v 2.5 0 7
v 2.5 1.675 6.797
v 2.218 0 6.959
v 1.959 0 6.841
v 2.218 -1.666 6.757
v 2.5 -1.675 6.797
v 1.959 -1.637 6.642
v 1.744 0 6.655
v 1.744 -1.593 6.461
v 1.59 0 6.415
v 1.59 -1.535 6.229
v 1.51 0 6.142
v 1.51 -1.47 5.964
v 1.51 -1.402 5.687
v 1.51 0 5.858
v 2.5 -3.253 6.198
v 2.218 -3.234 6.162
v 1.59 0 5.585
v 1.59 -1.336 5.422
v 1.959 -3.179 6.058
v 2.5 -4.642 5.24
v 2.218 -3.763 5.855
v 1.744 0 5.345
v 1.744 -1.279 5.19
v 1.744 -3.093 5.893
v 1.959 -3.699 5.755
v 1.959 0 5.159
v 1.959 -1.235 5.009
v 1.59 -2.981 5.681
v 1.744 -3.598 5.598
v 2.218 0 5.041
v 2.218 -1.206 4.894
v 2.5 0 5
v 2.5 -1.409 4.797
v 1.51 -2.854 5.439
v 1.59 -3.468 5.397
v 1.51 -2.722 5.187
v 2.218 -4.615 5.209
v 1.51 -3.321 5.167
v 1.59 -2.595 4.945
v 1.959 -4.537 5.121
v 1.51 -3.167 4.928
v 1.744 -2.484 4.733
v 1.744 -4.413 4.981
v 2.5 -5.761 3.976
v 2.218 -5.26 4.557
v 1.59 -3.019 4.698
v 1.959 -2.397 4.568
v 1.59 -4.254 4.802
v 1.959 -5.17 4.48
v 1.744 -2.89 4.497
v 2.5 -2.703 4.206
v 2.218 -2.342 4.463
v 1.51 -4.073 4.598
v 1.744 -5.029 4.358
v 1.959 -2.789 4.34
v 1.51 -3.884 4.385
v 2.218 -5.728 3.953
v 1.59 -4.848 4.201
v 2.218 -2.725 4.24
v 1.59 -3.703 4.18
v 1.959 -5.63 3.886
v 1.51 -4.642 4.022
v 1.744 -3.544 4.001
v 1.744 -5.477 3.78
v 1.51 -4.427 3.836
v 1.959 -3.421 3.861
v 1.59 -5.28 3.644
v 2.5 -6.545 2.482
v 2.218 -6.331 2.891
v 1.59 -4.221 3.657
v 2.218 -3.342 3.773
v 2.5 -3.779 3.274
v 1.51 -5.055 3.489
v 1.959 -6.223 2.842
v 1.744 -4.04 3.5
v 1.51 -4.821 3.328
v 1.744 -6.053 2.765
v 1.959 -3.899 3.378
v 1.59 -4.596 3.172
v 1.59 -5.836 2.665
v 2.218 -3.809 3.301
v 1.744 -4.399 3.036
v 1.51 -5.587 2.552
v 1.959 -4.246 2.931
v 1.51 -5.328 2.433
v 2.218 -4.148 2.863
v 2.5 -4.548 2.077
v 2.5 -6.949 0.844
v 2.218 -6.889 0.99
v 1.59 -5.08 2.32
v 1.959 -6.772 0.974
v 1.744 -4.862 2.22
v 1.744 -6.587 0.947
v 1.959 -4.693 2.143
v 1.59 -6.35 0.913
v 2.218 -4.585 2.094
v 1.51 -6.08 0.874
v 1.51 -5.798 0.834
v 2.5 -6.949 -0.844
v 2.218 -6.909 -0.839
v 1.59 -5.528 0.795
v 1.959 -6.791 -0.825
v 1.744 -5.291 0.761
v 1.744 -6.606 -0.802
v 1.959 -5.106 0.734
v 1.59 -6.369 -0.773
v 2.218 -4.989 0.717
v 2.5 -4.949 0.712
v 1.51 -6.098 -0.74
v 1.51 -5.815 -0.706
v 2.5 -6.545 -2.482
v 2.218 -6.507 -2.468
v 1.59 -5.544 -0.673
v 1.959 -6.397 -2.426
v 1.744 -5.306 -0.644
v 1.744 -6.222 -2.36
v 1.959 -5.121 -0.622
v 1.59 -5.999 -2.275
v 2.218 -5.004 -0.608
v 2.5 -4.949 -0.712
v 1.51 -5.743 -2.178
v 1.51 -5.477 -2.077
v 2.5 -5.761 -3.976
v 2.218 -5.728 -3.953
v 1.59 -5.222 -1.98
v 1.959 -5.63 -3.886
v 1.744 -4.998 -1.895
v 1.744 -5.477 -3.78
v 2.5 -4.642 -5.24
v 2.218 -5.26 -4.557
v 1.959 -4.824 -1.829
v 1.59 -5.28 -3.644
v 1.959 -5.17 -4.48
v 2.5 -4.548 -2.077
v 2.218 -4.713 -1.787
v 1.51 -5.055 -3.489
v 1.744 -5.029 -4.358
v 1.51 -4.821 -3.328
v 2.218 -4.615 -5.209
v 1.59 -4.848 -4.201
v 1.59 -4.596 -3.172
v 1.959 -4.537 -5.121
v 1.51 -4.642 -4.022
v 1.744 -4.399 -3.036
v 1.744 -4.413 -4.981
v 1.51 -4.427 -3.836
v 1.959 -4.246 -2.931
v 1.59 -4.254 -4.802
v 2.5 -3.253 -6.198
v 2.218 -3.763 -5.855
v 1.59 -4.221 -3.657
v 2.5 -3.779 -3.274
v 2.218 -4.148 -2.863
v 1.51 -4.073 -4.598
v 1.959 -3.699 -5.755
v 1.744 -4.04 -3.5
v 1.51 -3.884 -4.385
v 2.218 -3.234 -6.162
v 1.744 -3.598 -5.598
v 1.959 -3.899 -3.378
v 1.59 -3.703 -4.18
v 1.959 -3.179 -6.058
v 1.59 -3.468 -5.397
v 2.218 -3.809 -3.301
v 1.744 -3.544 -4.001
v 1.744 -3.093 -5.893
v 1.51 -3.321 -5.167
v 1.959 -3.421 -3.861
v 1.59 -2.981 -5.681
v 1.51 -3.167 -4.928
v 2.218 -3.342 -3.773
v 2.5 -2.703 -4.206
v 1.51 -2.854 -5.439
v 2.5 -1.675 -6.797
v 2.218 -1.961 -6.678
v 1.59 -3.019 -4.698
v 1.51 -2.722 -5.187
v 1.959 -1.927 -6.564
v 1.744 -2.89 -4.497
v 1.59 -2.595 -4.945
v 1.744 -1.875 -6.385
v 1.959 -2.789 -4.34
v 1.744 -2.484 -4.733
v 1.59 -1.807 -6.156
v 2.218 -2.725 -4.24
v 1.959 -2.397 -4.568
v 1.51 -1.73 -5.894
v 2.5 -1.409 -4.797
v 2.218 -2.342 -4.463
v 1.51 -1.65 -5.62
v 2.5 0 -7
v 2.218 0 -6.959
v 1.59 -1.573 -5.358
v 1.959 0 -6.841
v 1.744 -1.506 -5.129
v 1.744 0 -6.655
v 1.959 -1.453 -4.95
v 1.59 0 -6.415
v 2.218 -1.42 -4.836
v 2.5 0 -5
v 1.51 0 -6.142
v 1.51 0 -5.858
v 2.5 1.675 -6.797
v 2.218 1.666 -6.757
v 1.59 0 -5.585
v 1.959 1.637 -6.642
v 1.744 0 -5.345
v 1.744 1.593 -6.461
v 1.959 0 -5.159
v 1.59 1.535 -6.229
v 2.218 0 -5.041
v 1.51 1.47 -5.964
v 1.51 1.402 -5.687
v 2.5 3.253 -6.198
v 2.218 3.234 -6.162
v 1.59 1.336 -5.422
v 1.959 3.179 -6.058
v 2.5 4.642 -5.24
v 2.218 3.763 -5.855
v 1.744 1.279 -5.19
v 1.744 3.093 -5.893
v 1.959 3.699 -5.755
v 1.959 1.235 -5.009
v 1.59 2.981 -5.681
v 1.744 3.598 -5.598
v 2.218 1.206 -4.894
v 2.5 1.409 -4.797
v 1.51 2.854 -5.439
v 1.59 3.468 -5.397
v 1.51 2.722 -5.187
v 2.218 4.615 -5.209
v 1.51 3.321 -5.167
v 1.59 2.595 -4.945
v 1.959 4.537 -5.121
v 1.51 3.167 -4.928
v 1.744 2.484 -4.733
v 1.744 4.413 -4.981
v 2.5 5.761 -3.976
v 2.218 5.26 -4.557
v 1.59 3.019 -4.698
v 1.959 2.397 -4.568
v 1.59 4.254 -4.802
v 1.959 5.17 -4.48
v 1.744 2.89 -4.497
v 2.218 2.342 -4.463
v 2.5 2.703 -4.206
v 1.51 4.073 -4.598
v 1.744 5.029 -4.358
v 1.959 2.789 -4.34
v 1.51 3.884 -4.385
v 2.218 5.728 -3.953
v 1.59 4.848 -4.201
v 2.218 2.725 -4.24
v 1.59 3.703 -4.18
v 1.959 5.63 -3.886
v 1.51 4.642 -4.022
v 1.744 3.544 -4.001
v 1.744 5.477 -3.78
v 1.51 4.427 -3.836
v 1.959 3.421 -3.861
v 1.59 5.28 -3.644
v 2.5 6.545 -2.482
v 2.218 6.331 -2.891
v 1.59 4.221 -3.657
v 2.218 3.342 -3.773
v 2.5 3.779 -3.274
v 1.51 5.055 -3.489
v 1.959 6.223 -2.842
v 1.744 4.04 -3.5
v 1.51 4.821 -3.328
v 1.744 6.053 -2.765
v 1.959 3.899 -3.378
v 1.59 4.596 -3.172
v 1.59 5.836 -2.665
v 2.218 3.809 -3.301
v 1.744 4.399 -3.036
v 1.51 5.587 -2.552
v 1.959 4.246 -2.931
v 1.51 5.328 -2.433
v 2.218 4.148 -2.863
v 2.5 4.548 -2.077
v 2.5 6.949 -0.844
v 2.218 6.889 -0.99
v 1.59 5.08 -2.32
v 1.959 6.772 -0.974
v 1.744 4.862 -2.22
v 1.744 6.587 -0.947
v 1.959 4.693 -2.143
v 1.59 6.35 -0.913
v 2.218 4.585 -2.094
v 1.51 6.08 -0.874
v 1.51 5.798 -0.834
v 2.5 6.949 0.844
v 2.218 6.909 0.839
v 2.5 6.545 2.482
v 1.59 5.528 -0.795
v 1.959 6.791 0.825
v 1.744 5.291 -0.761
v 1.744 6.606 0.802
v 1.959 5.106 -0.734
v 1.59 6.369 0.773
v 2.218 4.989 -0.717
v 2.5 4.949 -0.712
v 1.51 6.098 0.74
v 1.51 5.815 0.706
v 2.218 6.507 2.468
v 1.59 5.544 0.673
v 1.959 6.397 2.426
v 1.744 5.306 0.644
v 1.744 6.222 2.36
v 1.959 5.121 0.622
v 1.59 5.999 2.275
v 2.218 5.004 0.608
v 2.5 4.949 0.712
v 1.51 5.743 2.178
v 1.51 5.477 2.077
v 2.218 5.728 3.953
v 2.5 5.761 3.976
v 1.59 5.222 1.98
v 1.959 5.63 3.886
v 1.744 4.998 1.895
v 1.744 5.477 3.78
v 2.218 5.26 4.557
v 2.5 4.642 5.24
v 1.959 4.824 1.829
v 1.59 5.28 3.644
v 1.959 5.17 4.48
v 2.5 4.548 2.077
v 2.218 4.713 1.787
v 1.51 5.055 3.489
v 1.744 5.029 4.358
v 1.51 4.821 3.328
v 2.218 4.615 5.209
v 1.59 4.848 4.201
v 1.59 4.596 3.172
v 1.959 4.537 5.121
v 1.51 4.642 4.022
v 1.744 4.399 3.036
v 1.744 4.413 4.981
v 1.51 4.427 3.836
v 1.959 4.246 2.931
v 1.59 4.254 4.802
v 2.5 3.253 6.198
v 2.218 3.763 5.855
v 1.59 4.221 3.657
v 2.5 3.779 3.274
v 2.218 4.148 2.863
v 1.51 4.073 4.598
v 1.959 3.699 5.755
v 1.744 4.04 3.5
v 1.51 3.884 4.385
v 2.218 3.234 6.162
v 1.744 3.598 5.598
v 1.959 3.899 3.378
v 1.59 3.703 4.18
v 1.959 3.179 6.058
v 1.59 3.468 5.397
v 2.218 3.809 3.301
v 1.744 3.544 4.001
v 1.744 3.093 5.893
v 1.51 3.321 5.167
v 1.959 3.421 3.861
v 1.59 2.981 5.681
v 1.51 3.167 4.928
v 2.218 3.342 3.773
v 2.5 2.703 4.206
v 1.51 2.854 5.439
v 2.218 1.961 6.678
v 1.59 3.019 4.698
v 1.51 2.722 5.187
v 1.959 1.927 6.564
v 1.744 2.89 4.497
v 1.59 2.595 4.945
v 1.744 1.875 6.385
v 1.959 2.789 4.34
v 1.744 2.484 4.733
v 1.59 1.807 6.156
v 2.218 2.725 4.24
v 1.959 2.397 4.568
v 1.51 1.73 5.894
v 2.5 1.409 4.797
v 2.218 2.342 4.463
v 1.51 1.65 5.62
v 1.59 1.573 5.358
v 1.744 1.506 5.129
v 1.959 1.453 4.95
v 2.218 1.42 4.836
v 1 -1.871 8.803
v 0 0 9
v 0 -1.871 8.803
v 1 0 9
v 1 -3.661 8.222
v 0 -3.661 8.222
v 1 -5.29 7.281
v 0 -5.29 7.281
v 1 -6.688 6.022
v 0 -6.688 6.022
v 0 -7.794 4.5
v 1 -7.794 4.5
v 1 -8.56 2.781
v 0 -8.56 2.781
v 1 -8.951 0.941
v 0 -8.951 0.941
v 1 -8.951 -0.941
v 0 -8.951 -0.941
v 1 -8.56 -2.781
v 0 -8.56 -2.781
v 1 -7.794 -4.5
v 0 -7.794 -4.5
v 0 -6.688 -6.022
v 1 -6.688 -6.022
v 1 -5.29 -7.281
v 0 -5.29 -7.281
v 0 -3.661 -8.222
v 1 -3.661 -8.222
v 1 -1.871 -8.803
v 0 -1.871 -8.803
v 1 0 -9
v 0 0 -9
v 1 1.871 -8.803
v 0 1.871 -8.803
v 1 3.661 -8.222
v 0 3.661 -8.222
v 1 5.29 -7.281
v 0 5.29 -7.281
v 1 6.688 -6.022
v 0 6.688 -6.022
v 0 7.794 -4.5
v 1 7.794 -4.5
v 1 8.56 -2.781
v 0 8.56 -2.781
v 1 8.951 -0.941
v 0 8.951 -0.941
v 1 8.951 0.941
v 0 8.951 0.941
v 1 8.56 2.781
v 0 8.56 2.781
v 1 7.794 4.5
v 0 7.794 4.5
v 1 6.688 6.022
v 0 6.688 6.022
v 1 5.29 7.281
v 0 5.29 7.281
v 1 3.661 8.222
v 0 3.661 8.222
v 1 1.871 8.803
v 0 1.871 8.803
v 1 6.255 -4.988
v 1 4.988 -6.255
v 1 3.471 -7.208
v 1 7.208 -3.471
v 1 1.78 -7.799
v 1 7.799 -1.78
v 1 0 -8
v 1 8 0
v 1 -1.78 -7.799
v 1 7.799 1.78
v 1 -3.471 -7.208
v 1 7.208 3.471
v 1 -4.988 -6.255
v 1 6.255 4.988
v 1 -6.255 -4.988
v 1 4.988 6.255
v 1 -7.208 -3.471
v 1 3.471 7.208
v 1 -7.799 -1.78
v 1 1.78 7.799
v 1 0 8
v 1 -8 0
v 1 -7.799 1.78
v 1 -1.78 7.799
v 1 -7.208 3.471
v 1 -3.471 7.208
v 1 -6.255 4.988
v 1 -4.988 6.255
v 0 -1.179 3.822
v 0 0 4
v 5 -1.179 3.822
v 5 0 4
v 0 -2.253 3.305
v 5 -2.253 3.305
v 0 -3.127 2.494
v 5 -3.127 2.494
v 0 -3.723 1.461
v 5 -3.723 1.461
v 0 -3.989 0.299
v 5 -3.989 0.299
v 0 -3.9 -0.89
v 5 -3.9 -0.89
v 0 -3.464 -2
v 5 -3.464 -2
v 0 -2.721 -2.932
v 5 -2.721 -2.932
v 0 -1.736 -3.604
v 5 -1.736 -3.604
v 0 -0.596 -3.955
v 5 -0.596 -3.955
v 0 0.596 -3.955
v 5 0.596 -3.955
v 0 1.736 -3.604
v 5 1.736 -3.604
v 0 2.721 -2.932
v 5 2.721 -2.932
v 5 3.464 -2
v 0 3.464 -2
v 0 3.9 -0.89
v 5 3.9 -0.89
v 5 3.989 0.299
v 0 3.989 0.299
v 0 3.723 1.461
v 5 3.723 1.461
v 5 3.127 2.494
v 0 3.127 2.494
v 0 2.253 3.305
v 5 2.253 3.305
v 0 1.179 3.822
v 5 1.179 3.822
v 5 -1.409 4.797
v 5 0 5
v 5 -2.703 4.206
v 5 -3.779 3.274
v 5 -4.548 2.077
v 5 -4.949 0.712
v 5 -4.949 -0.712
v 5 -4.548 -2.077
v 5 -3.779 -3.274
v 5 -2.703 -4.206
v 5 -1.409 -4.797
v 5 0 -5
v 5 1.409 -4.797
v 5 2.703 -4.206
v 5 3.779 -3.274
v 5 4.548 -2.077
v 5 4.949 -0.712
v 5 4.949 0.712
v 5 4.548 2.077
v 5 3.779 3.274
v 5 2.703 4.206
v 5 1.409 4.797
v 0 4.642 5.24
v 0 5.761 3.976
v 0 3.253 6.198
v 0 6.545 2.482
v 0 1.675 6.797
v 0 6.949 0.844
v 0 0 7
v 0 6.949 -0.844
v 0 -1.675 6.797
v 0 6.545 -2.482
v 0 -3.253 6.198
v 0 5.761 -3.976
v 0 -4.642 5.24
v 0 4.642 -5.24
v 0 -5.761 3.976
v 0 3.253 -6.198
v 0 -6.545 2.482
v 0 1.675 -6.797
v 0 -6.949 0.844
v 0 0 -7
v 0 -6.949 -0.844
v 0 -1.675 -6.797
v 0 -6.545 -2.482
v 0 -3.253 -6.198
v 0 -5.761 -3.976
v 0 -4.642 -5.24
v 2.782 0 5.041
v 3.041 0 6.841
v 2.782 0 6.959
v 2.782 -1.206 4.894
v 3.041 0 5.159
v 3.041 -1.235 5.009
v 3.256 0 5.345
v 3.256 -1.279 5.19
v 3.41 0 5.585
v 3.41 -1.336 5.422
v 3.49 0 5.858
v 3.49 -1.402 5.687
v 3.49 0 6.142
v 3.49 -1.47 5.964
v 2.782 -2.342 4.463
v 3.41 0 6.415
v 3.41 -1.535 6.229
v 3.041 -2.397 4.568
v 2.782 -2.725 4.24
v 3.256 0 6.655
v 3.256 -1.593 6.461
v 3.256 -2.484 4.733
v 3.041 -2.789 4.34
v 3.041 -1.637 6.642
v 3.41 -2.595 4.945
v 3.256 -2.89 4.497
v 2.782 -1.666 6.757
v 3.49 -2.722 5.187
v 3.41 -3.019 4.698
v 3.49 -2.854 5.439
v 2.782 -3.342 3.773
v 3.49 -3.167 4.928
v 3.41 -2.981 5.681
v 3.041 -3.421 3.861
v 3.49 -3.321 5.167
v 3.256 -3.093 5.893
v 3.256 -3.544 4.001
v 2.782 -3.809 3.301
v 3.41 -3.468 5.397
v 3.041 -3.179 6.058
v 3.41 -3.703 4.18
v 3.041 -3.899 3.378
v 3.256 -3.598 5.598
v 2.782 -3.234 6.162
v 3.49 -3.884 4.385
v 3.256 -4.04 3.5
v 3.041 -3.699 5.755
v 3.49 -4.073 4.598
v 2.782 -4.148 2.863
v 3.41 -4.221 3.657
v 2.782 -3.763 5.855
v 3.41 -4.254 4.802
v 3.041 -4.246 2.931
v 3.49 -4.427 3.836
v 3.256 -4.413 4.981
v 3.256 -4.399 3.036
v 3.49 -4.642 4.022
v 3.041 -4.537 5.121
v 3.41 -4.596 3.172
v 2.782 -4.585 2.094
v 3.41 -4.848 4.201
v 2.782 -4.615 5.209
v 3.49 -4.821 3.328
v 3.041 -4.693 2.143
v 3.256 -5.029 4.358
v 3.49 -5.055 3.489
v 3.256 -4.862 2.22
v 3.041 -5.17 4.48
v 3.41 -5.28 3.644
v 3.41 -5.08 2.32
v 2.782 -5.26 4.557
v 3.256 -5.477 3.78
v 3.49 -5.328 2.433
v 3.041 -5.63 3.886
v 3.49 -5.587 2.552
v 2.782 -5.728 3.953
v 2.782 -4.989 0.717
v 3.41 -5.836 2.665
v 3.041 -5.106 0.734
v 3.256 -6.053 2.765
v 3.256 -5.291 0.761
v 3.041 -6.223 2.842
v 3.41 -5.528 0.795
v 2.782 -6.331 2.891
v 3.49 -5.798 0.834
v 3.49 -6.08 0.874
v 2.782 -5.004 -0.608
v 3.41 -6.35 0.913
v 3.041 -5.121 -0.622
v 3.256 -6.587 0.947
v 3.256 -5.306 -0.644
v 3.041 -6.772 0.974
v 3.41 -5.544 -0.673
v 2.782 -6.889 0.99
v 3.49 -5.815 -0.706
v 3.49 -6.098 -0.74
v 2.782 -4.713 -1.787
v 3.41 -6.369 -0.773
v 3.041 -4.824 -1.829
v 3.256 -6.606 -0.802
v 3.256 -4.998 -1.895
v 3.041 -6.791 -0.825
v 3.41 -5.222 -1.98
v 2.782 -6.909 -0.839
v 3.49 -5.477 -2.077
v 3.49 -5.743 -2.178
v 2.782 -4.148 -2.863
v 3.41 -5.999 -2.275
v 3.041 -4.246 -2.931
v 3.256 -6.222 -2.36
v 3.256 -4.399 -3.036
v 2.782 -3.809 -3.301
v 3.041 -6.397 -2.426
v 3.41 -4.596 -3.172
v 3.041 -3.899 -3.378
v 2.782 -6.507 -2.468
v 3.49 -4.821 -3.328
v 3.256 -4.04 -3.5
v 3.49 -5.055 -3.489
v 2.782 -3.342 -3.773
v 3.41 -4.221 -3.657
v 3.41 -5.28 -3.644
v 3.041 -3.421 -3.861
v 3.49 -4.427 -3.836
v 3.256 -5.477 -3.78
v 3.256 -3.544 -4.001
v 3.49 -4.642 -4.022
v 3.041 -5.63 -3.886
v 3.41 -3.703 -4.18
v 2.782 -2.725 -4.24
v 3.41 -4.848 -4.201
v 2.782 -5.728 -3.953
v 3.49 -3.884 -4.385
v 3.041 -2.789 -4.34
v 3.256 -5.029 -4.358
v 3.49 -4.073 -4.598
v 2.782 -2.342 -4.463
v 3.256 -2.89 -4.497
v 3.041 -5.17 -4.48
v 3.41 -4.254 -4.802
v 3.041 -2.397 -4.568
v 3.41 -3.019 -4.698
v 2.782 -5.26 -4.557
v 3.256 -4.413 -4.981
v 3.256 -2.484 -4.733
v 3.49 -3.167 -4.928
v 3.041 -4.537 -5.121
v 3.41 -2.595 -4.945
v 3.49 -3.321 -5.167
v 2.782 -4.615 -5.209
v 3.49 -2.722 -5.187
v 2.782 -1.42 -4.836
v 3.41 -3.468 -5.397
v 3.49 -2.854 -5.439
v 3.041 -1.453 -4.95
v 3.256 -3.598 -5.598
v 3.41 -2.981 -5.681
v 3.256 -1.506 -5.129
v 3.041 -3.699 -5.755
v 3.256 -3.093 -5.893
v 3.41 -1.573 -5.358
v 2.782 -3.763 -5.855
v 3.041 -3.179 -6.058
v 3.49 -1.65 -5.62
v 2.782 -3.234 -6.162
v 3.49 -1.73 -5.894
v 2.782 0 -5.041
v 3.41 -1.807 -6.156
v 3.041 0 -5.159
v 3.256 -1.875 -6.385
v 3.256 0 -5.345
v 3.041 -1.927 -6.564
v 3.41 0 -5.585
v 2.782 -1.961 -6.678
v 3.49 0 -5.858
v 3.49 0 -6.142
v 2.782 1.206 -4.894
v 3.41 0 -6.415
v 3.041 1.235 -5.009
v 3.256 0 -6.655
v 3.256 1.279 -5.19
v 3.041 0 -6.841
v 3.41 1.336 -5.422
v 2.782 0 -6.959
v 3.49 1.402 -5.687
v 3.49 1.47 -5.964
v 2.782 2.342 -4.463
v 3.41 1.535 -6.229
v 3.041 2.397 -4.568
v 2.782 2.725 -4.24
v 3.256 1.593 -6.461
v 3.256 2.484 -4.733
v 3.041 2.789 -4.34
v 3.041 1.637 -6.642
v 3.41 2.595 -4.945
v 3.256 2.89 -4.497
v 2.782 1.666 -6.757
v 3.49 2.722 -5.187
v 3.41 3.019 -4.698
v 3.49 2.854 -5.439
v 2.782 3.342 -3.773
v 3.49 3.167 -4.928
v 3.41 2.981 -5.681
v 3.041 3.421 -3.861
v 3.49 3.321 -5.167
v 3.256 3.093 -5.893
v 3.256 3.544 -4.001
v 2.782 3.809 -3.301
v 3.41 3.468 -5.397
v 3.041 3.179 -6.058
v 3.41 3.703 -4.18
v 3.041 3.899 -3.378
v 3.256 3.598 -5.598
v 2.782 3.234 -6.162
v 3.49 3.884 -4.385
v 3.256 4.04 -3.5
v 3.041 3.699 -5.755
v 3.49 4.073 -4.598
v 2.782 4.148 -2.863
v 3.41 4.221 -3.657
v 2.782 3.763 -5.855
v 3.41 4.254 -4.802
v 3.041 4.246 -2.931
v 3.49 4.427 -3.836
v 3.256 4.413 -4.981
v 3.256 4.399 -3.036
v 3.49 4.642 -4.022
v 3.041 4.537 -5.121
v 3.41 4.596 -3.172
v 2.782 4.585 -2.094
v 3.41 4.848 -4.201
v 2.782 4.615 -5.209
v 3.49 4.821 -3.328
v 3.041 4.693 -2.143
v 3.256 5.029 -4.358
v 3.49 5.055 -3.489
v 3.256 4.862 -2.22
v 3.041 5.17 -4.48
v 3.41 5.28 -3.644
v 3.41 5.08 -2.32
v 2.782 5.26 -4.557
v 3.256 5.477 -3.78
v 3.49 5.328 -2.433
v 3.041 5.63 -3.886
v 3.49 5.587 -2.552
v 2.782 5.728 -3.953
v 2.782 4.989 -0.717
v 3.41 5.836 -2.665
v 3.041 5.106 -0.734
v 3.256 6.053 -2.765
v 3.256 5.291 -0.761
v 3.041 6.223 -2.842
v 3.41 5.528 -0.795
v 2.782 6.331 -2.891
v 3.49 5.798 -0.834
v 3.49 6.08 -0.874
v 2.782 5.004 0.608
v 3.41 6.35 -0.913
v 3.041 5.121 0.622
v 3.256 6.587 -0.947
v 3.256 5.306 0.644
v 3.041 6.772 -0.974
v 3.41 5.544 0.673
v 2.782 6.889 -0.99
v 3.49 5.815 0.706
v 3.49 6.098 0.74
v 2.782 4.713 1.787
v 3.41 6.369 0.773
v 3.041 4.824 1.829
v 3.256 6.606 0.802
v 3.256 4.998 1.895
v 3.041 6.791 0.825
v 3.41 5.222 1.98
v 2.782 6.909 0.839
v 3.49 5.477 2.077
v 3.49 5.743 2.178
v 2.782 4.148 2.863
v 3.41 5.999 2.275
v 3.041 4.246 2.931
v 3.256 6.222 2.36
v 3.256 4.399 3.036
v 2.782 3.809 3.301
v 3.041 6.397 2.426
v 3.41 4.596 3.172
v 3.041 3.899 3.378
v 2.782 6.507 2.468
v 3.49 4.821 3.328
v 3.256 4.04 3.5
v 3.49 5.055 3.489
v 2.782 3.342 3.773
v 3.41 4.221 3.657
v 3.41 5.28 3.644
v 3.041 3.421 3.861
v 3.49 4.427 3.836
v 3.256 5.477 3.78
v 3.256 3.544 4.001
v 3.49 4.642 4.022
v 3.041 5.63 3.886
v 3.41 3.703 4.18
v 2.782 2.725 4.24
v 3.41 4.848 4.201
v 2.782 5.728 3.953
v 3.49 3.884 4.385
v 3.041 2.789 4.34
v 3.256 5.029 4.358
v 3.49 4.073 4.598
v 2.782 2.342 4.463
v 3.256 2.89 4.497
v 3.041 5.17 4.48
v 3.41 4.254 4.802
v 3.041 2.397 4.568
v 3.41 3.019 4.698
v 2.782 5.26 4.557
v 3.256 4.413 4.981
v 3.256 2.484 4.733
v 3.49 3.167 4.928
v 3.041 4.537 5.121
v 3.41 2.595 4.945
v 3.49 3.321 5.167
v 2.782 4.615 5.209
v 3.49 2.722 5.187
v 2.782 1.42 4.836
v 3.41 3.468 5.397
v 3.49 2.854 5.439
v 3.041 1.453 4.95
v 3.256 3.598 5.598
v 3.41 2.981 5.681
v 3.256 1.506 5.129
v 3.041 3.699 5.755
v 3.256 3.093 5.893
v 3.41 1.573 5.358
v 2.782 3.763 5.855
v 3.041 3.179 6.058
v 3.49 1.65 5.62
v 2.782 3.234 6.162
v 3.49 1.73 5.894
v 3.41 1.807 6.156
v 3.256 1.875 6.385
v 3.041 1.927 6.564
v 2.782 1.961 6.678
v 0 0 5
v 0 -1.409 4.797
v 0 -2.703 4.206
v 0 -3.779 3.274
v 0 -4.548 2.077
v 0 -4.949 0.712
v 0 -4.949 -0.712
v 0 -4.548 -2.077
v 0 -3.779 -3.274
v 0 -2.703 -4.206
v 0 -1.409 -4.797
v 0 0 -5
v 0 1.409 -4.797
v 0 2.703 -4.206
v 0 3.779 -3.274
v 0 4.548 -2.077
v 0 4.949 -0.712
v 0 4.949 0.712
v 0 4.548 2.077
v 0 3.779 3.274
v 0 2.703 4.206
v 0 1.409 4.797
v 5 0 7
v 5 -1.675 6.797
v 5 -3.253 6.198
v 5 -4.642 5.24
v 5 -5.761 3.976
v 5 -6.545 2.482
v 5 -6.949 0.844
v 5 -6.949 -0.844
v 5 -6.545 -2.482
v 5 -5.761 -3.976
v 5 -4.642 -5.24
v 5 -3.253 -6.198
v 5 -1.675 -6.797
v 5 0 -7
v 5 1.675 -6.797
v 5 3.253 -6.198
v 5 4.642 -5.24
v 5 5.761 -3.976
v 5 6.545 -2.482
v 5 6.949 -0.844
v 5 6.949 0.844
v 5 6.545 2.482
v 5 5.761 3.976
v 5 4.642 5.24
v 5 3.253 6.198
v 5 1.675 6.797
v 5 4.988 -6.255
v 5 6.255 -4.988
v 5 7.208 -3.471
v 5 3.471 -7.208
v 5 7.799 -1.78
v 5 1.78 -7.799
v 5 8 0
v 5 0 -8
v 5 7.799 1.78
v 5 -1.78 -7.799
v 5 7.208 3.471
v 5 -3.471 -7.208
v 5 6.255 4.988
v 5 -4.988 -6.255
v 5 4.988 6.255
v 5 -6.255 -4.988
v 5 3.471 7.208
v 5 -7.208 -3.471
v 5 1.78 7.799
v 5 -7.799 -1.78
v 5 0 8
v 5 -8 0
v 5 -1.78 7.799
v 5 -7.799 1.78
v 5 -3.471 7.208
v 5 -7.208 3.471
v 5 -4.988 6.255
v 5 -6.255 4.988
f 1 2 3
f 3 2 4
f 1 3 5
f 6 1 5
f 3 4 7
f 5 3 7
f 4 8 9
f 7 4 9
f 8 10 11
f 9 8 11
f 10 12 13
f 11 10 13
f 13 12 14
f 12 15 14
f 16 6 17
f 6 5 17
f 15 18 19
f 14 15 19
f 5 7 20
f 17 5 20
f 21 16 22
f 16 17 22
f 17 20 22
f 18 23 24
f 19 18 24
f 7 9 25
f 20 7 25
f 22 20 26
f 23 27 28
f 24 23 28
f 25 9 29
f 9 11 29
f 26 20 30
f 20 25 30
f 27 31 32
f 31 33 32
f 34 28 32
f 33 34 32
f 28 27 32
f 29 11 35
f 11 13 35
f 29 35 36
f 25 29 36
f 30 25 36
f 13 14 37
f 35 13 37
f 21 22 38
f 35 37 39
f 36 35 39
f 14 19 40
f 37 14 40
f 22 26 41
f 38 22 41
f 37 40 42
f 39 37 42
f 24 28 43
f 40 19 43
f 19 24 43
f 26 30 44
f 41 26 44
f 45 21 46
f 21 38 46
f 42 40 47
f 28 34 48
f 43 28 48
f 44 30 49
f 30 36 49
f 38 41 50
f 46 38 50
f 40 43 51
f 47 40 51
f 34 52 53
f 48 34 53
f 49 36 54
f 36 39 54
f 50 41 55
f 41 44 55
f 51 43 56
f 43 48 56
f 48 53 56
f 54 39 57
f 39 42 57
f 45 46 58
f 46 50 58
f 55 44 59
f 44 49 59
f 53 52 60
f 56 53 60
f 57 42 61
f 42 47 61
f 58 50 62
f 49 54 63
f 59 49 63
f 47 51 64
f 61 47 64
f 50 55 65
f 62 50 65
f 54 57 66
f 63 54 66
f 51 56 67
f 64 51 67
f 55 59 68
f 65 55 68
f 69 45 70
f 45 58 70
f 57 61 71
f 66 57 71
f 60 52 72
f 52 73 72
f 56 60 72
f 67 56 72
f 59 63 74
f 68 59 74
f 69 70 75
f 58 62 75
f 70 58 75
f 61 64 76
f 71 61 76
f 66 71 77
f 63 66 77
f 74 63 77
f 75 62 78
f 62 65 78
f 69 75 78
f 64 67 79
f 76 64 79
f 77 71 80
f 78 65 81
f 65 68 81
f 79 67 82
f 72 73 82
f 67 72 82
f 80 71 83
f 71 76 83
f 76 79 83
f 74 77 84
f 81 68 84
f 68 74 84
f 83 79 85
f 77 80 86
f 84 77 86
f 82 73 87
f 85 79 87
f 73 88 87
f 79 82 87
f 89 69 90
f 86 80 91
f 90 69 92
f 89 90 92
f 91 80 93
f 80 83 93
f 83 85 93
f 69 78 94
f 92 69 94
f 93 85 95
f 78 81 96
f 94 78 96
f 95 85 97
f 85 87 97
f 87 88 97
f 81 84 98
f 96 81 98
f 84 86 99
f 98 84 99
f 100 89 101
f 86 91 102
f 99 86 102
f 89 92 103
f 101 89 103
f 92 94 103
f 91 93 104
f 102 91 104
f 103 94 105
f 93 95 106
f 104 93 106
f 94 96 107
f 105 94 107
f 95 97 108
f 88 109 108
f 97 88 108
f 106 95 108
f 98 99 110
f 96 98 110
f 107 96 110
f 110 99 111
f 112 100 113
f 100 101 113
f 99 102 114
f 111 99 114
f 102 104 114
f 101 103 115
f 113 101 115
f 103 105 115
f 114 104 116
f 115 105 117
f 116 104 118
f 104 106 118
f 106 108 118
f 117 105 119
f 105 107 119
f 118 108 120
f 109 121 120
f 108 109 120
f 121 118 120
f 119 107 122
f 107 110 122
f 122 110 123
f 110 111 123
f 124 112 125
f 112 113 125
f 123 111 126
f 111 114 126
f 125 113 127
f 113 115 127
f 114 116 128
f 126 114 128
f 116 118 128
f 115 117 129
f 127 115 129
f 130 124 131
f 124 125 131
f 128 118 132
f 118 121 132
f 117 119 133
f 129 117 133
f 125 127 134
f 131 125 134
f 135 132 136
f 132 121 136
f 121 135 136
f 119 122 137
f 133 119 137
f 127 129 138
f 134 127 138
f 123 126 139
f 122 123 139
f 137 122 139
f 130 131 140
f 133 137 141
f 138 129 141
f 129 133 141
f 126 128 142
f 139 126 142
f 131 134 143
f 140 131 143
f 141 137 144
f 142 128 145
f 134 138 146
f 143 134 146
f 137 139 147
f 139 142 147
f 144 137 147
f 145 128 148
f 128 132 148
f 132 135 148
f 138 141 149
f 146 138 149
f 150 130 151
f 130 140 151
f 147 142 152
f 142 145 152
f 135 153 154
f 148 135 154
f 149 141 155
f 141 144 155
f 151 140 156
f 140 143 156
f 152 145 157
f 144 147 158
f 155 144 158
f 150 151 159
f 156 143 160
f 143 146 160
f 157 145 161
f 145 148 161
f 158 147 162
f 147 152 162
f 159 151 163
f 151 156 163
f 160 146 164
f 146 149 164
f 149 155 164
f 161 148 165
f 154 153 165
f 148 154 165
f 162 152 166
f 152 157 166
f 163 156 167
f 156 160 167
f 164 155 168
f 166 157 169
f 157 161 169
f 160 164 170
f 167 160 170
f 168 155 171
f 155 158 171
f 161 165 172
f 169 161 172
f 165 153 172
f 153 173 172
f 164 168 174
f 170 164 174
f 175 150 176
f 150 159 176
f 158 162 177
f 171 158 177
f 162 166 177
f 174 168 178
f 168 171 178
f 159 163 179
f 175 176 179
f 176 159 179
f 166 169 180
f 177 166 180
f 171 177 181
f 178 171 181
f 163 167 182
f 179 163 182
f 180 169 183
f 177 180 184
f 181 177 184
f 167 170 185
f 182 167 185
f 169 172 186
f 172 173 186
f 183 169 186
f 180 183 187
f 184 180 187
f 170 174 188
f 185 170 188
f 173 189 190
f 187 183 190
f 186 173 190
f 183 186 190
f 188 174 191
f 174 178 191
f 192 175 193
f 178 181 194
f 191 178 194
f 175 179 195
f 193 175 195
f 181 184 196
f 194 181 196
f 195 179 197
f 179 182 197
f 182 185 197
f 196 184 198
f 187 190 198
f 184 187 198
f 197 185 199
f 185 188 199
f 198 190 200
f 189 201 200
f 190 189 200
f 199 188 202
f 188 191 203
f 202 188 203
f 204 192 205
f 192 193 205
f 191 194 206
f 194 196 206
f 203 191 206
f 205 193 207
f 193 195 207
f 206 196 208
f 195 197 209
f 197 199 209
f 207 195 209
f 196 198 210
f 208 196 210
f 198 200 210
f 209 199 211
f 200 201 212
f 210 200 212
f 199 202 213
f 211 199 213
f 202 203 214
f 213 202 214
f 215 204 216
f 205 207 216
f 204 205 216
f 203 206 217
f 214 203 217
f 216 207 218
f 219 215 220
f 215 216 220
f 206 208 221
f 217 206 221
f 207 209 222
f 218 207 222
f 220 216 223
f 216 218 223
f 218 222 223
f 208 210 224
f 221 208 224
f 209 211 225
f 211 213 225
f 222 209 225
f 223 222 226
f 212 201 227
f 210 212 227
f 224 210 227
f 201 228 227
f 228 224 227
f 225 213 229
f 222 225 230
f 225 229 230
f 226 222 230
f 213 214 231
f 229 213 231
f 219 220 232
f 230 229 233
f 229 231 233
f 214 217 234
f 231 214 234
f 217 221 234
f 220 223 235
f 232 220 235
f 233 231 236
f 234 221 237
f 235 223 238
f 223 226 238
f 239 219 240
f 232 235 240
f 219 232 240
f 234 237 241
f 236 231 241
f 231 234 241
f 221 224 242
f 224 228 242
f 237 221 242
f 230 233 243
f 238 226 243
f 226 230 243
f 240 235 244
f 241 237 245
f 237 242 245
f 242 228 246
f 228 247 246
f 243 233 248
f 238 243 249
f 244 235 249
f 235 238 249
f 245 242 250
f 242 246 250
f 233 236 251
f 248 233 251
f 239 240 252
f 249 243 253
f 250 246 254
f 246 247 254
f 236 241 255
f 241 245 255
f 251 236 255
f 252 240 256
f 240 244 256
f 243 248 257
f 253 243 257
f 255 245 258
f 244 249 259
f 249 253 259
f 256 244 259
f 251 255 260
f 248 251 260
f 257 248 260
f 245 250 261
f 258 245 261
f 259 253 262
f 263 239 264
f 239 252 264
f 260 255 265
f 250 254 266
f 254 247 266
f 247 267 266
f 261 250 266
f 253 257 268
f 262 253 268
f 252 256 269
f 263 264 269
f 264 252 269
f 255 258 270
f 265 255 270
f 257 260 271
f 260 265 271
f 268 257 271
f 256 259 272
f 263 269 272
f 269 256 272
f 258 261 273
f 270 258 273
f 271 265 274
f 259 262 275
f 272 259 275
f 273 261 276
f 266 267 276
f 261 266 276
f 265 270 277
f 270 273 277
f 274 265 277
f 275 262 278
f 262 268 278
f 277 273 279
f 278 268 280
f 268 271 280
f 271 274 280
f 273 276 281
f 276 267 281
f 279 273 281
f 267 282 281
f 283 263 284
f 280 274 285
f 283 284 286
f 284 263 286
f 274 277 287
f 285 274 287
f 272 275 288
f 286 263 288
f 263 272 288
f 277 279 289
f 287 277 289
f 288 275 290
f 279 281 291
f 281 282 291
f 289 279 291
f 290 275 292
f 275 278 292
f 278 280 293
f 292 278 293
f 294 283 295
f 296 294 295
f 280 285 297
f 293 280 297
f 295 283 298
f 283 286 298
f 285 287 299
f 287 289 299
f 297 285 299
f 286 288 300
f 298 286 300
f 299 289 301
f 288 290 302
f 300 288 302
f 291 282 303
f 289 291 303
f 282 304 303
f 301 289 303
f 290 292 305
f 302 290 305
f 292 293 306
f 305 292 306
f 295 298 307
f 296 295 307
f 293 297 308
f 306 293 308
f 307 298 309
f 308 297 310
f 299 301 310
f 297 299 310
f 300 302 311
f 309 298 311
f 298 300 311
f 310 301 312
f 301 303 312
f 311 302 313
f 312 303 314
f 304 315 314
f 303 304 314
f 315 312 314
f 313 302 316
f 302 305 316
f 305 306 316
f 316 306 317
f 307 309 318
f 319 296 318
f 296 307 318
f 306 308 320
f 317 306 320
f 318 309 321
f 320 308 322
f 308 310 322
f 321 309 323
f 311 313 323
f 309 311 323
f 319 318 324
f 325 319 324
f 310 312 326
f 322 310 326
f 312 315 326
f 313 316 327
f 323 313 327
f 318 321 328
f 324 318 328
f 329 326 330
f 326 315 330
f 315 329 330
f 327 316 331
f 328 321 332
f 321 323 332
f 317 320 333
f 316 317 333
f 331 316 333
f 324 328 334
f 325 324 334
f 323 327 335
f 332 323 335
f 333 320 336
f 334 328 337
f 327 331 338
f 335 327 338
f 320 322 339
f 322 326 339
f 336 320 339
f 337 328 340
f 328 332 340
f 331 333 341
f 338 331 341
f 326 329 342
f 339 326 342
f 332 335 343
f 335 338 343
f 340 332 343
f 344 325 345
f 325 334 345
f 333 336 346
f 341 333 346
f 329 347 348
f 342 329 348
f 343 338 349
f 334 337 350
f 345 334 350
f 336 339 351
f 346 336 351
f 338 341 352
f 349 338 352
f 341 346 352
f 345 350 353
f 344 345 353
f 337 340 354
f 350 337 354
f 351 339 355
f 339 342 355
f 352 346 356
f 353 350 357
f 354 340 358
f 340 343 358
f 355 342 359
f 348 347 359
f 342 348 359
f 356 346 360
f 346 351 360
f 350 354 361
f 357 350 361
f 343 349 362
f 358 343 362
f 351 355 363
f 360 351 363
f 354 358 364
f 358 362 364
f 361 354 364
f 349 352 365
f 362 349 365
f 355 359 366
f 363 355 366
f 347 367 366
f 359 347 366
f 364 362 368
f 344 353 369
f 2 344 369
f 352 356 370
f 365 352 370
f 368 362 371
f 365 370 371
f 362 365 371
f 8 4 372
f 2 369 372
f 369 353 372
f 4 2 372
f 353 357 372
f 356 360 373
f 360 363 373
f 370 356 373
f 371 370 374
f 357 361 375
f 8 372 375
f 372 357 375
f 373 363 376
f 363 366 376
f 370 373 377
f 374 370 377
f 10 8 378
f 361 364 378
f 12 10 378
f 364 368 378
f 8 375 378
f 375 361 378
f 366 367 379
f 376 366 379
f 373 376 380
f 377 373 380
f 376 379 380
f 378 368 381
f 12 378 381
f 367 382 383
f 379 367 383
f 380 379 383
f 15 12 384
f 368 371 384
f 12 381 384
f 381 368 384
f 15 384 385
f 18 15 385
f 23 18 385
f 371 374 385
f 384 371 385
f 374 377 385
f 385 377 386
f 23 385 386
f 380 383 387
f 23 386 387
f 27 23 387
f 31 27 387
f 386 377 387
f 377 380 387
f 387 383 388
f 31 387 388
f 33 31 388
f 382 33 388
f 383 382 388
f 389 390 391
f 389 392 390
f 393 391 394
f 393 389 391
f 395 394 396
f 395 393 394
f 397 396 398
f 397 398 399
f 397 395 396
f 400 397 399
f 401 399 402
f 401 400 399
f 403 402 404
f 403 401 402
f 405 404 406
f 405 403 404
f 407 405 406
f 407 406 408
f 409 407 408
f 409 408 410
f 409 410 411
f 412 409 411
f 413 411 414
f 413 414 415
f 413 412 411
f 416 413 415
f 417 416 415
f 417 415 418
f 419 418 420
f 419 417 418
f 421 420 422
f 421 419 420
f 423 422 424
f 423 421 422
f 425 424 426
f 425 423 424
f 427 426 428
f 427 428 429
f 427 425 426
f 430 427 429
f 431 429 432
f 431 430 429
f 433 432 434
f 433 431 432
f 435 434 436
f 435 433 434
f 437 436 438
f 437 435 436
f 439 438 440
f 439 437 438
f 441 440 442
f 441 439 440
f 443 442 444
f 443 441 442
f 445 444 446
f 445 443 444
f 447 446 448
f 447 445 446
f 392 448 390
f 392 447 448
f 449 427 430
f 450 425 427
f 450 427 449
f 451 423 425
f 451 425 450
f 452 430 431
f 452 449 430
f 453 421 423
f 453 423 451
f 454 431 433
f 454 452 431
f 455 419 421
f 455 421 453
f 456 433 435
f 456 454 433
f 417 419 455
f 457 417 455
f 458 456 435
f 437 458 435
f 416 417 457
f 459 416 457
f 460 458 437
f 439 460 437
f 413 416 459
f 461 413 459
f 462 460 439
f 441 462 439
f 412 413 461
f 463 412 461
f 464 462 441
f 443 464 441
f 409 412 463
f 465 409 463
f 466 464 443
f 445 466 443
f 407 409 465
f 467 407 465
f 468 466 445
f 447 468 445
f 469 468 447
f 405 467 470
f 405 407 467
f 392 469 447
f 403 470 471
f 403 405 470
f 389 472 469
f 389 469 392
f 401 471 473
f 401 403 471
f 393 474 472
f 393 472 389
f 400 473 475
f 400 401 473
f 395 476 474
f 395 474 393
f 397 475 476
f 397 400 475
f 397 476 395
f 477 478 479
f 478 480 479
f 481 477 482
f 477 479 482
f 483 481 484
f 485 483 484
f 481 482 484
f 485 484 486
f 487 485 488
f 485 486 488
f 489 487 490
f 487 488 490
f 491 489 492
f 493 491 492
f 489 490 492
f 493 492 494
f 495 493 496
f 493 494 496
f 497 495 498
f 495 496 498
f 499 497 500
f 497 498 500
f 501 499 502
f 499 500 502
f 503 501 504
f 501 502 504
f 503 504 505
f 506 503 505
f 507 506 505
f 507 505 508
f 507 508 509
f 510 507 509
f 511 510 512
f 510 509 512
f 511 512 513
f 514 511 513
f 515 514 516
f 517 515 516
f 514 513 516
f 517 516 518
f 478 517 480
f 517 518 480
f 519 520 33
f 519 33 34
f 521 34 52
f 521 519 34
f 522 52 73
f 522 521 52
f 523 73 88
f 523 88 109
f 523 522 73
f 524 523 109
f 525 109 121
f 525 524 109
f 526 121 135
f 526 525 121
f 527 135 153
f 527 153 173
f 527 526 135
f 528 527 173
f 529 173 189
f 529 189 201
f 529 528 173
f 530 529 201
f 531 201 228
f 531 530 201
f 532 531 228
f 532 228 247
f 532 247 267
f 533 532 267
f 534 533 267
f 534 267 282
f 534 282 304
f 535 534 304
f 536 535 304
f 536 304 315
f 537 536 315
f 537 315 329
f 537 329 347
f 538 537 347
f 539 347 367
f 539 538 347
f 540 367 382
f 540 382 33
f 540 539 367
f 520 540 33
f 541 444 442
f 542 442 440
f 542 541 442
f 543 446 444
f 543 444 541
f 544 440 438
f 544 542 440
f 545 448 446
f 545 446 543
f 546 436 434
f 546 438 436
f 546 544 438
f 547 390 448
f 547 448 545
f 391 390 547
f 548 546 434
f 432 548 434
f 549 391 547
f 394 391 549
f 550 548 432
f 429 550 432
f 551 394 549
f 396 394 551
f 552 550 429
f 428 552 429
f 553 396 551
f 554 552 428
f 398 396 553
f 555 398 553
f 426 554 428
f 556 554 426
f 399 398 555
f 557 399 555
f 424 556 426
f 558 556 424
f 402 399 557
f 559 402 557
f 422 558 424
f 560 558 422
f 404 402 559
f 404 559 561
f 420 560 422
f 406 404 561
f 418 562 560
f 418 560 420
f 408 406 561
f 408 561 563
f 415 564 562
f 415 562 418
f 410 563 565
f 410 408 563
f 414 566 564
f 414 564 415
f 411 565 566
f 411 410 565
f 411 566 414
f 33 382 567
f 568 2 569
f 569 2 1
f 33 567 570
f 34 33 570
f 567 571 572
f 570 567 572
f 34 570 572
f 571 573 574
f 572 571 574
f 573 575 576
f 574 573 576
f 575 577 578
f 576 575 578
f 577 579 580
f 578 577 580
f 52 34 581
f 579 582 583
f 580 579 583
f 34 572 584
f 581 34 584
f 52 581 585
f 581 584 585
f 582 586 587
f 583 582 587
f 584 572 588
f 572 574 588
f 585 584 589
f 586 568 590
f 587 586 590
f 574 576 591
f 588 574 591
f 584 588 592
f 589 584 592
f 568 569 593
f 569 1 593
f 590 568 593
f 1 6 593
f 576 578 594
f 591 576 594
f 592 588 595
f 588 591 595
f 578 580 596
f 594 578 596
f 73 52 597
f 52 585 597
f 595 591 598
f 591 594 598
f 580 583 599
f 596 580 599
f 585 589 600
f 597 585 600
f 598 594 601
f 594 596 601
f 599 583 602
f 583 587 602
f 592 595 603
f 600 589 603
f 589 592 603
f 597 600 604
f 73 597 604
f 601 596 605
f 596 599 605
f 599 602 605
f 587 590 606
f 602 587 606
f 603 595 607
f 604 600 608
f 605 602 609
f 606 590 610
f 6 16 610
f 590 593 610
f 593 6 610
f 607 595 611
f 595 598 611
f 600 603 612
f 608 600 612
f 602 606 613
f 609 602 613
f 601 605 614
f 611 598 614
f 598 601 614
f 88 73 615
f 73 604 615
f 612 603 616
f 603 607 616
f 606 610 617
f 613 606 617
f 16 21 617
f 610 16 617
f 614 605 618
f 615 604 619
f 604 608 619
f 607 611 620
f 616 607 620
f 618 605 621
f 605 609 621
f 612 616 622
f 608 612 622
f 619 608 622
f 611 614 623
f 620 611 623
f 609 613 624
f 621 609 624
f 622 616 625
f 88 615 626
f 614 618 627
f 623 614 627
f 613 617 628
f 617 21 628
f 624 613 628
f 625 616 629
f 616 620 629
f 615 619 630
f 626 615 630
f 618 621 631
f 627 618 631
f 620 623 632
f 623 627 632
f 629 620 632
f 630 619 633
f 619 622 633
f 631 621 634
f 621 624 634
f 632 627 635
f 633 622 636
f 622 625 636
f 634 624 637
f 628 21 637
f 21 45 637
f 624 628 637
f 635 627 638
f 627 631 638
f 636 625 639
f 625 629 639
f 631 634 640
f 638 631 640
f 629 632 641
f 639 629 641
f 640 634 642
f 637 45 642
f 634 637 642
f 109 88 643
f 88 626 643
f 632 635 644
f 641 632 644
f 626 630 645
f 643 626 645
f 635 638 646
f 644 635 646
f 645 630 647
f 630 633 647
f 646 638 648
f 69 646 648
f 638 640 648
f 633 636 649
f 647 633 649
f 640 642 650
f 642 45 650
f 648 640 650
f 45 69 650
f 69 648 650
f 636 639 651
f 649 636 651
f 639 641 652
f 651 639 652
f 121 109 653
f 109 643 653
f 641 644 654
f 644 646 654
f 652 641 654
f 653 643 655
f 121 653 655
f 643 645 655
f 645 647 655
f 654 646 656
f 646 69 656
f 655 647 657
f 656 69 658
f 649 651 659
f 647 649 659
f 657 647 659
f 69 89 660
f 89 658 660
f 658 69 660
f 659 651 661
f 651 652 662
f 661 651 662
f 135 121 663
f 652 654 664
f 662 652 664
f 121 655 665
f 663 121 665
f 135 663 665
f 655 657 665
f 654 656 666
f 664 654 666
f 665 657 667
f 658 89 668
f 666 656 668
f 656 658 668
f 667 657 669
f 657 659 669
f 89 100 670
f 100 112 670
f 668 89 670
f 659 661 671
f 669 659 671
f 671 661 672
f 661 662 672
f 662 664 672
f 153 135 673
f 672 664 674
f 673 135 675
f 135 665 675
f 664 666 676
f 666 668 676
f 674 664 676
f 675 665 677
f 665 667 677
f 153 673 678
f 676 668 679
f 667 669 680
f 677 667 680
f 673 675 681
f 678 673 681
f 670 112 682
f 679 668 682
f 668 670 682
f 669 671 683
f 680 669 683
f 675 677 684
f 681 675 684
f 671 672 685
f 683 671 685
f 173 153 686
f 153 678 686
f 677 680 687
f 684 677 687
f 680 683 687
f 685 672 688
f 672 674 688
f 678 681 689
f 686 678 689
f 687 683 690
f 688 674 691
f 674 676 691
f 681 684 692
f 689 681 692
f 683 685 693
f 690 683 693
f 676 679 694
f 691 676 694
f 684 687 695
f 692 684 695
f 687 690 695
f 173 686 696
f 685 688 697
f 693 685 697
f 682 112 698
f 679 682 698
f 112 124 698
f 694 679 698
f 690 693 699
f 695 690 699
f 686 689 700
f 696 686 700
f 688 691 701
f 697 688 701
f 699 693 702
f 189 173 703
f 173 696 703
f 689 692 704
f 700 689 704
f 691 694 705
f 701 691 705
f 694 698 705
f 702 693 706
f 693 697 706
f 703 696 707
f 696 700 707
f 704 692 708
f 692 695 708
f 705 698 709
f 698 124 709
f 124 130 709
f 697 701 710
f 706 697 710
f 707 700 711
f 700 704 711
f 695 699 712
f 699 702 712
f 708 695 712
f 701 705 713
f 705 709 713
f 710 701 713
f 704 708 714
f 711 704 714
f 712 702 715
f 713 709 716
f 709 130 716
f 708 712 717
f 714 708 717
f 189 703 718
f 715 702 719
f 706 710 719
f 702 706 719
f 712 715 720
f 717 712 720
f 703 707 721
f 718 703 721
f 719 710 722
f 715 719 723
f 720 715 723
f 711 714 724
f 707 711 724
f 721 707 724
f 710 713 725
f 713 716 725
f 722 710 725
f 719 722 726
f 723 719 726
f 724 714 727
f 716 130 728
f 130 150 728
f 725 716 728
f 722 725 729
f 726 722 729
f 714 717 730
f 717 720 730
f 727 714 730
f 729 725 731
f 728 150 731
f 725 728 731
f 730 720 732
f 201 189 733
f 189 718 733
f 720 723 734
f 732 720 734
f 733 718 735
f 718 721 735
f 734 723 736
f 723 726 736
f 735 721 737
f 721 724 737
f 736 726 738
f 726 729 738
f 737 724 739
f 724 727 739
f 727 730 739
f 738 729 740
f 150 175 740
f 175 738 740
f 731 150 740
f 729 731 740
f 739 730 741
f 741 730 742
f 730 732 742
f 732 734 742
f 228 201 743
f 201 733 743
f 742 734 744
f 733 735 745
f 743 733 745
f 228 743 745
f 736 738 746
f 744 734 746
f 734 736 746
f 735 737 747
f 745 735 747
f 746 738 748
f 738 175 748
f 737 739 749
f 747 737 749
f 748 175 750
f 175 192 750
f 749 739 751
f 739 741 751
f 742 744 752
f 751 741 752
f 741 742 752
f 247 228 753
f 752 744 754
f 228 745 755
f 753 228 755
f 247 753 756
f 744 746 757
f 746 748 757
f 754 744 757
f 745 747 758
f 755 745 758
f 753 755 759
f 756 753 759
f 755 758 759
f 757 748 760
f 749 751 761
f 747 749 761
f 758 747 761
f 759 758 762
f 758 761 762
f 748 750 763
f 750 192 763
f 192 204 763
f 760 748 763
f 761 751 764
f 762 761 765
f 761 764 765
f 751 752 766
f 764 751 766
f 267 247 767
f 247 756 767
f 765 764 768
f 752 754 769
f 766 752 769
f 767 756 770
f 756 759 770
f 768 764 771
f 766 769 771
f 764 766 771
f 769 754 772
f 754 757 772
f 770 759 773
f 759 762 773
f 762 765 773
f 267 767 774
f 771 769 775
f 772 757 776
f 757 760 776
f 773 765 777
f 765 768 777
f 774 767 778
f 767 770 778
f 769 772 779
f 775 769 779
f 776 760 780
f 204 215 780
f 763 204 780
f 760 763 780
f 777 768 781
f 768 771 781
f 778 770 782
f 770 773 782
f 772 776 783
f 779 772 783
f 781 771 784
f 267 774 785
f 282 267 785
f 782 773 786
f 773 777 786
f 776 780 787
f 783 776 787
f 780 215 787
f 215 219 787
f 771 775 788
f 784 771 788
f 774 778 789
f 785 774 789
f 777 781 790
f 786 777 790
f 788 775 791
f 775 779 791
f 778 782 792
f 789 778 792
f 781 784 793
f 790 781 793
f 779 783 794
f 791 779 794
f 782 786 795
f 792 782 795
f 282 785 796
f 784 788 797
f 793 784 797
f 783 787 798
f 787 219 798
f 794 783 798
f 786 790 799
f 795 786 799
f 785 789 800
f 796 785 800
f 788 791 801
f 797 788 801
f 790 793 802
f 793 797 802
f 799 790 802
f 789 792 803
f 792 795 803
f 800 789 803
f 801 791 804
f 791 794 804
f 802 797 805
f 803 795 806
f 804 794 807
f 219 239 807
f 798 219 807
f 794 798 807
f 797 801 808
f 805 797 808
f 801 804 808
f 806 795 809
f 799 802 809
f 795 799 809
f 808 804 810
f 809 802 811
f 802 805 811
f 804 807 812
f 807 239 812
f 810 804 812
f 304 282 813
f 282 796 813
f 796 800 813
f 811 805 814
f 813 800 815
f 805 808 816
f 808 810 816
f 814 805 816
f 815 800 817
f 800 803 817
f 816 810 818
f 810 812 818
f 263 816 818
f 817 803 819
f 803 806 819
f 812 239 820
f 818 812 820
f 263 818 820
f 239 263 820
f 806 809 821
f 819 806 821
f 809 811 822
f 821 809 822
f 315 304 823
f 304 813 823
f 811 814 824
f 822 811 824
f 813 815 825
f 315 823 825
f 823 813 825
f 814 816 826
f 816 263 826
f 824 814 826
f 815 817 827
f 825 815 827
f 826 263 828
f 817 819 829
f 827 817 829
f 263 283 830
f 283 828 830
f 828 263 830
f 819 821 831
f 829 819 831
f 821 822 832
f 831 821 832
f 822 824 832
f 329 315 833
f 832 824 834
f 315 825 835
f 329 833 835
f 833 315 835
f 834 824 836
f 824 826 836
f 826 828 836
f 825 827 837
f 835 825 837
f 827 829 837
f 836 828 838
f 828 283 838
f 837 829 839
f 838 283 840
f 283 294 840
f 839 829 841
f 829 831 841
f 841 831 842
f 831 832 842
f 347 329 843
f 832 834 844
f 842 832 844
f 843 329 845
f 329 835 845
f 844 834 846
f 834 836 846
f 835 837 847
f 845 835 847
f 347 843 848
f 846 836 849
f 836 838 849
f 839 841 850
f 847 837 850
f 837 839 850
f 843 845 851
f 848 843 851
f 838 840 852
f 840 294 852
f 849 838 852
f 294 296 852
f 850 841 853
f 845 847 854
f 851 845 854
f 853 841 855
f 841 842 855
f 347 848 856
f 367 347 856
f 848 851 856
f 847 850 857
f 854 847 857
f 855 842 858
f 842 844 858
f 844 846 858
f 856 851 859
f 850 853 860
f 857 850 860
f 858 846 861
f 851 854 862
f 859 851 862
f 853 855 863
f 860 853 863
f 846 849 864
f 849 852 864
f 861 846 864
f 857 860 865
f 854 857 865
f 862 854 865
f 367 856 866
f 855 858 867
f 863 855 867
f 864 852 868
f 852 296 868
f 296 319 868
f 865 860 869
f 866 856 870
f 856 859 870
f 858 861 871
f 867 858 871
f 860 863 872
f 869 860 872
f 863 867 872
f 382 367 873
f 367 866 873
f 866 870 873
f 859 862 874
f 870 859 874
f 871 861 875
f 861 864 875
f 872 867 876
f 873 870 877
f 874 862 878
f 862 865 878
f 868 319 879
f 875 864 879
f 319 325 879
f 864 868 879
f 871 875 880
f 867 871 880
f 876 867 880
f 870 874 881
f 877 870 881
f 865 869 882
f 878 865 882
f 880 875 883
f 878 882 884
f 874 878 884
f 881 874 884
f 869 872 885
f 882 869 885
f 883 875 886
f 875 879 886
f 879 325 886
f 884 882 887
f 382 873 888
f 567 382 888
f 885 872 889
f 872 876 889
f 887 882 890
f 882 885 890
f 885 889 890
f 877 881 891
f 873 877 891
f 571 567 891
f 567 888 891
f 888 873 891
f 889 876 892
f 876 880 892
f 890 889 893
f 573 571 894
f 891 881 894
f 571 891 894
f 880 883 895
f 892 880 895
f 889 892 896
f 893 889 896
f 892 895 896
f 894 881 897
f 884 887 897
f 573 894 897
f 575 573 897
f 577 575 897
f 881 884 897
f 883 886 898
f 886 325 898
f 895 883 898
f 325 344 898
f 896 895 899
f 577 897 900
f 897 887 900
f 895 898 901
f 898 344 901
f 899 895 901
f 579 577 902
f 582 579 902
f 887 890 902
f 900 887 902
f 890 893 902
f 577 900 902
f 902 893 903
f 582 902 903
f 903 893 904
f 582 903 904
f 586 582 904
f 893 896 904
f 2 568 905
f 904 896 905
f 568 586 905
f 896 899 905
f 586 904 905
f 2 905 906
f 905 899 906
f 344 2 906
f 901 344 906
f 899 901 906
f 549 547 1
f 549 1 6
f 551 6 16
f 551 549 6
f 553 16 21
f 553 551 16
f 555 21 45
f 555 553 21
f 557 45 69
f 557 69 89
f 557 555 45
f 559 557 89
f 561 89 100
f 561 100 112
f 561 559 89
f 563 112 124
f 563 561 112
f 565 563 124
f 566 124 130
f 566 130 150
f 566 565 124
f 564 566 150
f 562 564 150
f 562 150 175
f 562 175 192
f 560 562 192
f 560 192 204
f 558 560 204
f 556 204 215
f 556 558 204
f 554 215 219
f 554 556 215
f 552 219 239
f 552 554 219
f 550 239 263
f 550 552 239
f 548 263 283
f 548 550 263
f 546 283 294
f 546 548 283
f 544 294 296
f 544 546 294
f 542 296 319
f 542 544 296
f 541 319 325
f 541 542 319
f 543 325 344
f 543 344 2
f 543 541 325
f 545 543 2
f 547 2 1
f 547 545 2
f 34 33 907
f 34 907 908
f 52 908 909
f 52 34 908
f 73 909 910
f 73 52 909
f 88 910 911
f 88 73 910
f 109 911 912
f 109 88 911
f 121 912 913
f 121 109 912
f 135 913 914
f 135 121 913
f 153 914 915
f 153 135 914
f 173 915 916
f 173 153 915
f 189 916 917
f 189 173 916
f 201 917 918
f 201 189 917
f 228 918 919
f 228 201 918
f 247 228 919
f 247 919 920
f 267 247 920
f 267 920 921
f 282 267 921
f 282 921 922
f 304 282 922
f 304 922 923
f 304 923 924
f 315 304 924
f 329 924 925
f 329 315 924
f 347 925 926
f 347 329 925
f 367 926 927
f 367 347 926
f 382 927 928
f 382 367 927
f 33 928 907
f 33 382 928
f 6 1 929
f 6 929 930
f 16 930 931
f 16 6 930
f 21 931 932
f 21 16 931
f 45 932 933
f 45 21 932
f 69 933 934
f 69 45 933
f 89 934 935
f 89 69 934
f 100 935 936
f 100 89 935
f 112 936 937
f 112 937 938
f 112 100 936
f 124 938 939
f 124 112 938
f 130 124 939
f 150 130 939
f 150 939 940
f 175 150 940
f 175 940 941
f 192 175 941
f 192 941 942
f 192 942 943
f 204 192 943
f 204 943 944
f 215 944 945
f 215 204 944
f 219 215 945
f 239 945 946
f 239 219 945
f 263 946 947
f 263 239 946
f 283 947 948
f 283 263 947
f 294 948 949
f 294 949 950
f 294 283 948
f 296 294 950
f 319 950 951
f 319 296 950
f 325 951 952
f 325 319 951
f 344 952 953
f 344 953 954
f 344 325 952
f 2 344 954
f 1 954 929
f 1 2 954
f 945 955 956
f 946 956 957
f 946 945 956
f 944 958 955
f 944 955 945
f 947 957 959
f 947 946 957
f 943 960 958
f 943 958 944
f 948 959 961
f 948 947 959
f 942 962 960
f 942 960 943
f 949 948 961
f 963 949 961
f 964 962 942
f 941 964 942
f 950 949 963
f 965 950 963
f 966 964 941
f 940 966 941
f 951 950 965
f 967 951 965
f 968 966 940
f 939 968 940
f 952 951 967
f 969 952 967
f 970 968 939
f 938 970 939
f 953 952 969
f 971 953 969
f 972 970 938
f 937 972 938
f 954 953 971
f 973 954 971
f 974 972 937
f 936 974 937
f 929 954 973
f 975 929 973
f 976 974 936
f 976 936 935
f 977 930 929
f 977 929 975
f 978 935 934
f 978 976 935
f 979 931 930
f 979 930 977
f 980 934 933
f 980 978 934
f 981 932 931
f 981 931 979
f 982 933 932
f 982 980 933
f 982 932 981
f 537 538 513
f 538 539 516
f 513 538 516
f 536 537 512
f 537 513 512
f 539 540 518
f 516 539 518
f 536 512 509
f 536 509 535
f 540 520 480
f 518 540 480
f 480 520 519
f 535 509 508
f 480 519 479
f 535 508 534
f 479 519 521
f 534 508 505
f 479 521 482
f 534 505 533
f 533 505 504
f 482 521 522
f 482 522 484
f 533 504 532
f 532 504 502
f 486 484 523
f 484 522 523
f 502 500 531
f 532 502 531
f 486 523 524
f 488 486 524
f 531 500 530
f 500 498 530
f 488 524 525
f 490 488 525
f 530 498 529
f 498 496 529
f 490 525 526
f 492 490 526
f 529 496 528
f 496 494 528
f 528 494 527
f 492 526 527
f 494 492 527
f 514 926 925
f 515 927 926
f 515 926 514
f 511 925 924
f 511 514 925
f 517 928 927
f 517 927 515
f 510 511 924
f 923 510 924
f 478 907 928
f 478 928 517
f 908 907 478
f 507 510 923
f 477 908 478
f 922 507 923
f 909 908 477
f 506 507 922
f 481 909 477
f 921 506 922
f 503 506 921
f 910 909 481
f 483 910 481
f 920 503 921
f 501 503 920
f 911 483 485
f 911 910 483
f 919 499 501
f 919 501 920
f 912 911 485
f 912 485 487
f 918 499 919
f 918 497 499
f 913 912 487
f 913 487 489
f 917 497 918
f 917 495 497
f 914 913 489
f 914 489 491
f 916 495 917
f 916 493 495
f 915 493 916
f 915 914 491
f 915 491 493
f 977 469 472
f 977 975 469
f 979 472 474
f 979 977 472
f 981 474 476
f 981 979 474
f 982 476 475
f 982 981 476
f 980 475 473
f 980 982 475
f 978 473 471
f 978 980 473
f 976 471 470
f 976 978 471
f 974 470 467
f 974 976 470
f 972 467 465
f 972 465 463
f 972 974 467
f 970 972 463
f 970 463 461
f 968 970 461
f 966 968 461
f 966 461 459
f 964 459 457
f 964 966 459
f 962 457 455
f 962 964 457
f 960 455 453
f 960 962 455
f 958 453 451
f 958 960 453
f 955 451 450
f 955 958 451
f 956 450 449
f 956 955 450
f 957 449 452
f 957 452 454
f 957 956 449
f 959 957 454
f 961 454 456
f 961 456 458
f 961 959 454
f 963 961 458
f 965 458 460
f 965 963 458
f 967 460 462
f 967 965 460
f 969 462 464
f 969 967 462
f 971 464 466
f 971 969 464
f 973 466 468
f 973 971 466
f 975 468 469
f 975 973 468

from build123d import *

# Parameters (mm, degrees)
SKETCH1_R = 1
SKETCH1_W = 5
SKETCH1_H = 1


with BuildPart() as part:
    # Sketch1 → Revolve1 (revolve)
    with BuildSketch(Plane.XY, mode=Mode.PRIVATE) as revolve1_sk:
        Polygon((5, 8), (5, 7), (0, 7), (0, 9), (1, 9), (1, 8), align=None)
        with Locations((2.5, 6)):
            Circle(SKETCH1_R)
        with Locations((2.5, 4.5)):
            Rectangle(SKETCH1_W, SKETCH1_H)
    revolve(revolve1_sk.sketch.rotate(Axis((0, 0, 0), (1, 0, 0)), 90), axis=Axis((0, 0, 0), (1, 0, 0)))


solid = part.part
